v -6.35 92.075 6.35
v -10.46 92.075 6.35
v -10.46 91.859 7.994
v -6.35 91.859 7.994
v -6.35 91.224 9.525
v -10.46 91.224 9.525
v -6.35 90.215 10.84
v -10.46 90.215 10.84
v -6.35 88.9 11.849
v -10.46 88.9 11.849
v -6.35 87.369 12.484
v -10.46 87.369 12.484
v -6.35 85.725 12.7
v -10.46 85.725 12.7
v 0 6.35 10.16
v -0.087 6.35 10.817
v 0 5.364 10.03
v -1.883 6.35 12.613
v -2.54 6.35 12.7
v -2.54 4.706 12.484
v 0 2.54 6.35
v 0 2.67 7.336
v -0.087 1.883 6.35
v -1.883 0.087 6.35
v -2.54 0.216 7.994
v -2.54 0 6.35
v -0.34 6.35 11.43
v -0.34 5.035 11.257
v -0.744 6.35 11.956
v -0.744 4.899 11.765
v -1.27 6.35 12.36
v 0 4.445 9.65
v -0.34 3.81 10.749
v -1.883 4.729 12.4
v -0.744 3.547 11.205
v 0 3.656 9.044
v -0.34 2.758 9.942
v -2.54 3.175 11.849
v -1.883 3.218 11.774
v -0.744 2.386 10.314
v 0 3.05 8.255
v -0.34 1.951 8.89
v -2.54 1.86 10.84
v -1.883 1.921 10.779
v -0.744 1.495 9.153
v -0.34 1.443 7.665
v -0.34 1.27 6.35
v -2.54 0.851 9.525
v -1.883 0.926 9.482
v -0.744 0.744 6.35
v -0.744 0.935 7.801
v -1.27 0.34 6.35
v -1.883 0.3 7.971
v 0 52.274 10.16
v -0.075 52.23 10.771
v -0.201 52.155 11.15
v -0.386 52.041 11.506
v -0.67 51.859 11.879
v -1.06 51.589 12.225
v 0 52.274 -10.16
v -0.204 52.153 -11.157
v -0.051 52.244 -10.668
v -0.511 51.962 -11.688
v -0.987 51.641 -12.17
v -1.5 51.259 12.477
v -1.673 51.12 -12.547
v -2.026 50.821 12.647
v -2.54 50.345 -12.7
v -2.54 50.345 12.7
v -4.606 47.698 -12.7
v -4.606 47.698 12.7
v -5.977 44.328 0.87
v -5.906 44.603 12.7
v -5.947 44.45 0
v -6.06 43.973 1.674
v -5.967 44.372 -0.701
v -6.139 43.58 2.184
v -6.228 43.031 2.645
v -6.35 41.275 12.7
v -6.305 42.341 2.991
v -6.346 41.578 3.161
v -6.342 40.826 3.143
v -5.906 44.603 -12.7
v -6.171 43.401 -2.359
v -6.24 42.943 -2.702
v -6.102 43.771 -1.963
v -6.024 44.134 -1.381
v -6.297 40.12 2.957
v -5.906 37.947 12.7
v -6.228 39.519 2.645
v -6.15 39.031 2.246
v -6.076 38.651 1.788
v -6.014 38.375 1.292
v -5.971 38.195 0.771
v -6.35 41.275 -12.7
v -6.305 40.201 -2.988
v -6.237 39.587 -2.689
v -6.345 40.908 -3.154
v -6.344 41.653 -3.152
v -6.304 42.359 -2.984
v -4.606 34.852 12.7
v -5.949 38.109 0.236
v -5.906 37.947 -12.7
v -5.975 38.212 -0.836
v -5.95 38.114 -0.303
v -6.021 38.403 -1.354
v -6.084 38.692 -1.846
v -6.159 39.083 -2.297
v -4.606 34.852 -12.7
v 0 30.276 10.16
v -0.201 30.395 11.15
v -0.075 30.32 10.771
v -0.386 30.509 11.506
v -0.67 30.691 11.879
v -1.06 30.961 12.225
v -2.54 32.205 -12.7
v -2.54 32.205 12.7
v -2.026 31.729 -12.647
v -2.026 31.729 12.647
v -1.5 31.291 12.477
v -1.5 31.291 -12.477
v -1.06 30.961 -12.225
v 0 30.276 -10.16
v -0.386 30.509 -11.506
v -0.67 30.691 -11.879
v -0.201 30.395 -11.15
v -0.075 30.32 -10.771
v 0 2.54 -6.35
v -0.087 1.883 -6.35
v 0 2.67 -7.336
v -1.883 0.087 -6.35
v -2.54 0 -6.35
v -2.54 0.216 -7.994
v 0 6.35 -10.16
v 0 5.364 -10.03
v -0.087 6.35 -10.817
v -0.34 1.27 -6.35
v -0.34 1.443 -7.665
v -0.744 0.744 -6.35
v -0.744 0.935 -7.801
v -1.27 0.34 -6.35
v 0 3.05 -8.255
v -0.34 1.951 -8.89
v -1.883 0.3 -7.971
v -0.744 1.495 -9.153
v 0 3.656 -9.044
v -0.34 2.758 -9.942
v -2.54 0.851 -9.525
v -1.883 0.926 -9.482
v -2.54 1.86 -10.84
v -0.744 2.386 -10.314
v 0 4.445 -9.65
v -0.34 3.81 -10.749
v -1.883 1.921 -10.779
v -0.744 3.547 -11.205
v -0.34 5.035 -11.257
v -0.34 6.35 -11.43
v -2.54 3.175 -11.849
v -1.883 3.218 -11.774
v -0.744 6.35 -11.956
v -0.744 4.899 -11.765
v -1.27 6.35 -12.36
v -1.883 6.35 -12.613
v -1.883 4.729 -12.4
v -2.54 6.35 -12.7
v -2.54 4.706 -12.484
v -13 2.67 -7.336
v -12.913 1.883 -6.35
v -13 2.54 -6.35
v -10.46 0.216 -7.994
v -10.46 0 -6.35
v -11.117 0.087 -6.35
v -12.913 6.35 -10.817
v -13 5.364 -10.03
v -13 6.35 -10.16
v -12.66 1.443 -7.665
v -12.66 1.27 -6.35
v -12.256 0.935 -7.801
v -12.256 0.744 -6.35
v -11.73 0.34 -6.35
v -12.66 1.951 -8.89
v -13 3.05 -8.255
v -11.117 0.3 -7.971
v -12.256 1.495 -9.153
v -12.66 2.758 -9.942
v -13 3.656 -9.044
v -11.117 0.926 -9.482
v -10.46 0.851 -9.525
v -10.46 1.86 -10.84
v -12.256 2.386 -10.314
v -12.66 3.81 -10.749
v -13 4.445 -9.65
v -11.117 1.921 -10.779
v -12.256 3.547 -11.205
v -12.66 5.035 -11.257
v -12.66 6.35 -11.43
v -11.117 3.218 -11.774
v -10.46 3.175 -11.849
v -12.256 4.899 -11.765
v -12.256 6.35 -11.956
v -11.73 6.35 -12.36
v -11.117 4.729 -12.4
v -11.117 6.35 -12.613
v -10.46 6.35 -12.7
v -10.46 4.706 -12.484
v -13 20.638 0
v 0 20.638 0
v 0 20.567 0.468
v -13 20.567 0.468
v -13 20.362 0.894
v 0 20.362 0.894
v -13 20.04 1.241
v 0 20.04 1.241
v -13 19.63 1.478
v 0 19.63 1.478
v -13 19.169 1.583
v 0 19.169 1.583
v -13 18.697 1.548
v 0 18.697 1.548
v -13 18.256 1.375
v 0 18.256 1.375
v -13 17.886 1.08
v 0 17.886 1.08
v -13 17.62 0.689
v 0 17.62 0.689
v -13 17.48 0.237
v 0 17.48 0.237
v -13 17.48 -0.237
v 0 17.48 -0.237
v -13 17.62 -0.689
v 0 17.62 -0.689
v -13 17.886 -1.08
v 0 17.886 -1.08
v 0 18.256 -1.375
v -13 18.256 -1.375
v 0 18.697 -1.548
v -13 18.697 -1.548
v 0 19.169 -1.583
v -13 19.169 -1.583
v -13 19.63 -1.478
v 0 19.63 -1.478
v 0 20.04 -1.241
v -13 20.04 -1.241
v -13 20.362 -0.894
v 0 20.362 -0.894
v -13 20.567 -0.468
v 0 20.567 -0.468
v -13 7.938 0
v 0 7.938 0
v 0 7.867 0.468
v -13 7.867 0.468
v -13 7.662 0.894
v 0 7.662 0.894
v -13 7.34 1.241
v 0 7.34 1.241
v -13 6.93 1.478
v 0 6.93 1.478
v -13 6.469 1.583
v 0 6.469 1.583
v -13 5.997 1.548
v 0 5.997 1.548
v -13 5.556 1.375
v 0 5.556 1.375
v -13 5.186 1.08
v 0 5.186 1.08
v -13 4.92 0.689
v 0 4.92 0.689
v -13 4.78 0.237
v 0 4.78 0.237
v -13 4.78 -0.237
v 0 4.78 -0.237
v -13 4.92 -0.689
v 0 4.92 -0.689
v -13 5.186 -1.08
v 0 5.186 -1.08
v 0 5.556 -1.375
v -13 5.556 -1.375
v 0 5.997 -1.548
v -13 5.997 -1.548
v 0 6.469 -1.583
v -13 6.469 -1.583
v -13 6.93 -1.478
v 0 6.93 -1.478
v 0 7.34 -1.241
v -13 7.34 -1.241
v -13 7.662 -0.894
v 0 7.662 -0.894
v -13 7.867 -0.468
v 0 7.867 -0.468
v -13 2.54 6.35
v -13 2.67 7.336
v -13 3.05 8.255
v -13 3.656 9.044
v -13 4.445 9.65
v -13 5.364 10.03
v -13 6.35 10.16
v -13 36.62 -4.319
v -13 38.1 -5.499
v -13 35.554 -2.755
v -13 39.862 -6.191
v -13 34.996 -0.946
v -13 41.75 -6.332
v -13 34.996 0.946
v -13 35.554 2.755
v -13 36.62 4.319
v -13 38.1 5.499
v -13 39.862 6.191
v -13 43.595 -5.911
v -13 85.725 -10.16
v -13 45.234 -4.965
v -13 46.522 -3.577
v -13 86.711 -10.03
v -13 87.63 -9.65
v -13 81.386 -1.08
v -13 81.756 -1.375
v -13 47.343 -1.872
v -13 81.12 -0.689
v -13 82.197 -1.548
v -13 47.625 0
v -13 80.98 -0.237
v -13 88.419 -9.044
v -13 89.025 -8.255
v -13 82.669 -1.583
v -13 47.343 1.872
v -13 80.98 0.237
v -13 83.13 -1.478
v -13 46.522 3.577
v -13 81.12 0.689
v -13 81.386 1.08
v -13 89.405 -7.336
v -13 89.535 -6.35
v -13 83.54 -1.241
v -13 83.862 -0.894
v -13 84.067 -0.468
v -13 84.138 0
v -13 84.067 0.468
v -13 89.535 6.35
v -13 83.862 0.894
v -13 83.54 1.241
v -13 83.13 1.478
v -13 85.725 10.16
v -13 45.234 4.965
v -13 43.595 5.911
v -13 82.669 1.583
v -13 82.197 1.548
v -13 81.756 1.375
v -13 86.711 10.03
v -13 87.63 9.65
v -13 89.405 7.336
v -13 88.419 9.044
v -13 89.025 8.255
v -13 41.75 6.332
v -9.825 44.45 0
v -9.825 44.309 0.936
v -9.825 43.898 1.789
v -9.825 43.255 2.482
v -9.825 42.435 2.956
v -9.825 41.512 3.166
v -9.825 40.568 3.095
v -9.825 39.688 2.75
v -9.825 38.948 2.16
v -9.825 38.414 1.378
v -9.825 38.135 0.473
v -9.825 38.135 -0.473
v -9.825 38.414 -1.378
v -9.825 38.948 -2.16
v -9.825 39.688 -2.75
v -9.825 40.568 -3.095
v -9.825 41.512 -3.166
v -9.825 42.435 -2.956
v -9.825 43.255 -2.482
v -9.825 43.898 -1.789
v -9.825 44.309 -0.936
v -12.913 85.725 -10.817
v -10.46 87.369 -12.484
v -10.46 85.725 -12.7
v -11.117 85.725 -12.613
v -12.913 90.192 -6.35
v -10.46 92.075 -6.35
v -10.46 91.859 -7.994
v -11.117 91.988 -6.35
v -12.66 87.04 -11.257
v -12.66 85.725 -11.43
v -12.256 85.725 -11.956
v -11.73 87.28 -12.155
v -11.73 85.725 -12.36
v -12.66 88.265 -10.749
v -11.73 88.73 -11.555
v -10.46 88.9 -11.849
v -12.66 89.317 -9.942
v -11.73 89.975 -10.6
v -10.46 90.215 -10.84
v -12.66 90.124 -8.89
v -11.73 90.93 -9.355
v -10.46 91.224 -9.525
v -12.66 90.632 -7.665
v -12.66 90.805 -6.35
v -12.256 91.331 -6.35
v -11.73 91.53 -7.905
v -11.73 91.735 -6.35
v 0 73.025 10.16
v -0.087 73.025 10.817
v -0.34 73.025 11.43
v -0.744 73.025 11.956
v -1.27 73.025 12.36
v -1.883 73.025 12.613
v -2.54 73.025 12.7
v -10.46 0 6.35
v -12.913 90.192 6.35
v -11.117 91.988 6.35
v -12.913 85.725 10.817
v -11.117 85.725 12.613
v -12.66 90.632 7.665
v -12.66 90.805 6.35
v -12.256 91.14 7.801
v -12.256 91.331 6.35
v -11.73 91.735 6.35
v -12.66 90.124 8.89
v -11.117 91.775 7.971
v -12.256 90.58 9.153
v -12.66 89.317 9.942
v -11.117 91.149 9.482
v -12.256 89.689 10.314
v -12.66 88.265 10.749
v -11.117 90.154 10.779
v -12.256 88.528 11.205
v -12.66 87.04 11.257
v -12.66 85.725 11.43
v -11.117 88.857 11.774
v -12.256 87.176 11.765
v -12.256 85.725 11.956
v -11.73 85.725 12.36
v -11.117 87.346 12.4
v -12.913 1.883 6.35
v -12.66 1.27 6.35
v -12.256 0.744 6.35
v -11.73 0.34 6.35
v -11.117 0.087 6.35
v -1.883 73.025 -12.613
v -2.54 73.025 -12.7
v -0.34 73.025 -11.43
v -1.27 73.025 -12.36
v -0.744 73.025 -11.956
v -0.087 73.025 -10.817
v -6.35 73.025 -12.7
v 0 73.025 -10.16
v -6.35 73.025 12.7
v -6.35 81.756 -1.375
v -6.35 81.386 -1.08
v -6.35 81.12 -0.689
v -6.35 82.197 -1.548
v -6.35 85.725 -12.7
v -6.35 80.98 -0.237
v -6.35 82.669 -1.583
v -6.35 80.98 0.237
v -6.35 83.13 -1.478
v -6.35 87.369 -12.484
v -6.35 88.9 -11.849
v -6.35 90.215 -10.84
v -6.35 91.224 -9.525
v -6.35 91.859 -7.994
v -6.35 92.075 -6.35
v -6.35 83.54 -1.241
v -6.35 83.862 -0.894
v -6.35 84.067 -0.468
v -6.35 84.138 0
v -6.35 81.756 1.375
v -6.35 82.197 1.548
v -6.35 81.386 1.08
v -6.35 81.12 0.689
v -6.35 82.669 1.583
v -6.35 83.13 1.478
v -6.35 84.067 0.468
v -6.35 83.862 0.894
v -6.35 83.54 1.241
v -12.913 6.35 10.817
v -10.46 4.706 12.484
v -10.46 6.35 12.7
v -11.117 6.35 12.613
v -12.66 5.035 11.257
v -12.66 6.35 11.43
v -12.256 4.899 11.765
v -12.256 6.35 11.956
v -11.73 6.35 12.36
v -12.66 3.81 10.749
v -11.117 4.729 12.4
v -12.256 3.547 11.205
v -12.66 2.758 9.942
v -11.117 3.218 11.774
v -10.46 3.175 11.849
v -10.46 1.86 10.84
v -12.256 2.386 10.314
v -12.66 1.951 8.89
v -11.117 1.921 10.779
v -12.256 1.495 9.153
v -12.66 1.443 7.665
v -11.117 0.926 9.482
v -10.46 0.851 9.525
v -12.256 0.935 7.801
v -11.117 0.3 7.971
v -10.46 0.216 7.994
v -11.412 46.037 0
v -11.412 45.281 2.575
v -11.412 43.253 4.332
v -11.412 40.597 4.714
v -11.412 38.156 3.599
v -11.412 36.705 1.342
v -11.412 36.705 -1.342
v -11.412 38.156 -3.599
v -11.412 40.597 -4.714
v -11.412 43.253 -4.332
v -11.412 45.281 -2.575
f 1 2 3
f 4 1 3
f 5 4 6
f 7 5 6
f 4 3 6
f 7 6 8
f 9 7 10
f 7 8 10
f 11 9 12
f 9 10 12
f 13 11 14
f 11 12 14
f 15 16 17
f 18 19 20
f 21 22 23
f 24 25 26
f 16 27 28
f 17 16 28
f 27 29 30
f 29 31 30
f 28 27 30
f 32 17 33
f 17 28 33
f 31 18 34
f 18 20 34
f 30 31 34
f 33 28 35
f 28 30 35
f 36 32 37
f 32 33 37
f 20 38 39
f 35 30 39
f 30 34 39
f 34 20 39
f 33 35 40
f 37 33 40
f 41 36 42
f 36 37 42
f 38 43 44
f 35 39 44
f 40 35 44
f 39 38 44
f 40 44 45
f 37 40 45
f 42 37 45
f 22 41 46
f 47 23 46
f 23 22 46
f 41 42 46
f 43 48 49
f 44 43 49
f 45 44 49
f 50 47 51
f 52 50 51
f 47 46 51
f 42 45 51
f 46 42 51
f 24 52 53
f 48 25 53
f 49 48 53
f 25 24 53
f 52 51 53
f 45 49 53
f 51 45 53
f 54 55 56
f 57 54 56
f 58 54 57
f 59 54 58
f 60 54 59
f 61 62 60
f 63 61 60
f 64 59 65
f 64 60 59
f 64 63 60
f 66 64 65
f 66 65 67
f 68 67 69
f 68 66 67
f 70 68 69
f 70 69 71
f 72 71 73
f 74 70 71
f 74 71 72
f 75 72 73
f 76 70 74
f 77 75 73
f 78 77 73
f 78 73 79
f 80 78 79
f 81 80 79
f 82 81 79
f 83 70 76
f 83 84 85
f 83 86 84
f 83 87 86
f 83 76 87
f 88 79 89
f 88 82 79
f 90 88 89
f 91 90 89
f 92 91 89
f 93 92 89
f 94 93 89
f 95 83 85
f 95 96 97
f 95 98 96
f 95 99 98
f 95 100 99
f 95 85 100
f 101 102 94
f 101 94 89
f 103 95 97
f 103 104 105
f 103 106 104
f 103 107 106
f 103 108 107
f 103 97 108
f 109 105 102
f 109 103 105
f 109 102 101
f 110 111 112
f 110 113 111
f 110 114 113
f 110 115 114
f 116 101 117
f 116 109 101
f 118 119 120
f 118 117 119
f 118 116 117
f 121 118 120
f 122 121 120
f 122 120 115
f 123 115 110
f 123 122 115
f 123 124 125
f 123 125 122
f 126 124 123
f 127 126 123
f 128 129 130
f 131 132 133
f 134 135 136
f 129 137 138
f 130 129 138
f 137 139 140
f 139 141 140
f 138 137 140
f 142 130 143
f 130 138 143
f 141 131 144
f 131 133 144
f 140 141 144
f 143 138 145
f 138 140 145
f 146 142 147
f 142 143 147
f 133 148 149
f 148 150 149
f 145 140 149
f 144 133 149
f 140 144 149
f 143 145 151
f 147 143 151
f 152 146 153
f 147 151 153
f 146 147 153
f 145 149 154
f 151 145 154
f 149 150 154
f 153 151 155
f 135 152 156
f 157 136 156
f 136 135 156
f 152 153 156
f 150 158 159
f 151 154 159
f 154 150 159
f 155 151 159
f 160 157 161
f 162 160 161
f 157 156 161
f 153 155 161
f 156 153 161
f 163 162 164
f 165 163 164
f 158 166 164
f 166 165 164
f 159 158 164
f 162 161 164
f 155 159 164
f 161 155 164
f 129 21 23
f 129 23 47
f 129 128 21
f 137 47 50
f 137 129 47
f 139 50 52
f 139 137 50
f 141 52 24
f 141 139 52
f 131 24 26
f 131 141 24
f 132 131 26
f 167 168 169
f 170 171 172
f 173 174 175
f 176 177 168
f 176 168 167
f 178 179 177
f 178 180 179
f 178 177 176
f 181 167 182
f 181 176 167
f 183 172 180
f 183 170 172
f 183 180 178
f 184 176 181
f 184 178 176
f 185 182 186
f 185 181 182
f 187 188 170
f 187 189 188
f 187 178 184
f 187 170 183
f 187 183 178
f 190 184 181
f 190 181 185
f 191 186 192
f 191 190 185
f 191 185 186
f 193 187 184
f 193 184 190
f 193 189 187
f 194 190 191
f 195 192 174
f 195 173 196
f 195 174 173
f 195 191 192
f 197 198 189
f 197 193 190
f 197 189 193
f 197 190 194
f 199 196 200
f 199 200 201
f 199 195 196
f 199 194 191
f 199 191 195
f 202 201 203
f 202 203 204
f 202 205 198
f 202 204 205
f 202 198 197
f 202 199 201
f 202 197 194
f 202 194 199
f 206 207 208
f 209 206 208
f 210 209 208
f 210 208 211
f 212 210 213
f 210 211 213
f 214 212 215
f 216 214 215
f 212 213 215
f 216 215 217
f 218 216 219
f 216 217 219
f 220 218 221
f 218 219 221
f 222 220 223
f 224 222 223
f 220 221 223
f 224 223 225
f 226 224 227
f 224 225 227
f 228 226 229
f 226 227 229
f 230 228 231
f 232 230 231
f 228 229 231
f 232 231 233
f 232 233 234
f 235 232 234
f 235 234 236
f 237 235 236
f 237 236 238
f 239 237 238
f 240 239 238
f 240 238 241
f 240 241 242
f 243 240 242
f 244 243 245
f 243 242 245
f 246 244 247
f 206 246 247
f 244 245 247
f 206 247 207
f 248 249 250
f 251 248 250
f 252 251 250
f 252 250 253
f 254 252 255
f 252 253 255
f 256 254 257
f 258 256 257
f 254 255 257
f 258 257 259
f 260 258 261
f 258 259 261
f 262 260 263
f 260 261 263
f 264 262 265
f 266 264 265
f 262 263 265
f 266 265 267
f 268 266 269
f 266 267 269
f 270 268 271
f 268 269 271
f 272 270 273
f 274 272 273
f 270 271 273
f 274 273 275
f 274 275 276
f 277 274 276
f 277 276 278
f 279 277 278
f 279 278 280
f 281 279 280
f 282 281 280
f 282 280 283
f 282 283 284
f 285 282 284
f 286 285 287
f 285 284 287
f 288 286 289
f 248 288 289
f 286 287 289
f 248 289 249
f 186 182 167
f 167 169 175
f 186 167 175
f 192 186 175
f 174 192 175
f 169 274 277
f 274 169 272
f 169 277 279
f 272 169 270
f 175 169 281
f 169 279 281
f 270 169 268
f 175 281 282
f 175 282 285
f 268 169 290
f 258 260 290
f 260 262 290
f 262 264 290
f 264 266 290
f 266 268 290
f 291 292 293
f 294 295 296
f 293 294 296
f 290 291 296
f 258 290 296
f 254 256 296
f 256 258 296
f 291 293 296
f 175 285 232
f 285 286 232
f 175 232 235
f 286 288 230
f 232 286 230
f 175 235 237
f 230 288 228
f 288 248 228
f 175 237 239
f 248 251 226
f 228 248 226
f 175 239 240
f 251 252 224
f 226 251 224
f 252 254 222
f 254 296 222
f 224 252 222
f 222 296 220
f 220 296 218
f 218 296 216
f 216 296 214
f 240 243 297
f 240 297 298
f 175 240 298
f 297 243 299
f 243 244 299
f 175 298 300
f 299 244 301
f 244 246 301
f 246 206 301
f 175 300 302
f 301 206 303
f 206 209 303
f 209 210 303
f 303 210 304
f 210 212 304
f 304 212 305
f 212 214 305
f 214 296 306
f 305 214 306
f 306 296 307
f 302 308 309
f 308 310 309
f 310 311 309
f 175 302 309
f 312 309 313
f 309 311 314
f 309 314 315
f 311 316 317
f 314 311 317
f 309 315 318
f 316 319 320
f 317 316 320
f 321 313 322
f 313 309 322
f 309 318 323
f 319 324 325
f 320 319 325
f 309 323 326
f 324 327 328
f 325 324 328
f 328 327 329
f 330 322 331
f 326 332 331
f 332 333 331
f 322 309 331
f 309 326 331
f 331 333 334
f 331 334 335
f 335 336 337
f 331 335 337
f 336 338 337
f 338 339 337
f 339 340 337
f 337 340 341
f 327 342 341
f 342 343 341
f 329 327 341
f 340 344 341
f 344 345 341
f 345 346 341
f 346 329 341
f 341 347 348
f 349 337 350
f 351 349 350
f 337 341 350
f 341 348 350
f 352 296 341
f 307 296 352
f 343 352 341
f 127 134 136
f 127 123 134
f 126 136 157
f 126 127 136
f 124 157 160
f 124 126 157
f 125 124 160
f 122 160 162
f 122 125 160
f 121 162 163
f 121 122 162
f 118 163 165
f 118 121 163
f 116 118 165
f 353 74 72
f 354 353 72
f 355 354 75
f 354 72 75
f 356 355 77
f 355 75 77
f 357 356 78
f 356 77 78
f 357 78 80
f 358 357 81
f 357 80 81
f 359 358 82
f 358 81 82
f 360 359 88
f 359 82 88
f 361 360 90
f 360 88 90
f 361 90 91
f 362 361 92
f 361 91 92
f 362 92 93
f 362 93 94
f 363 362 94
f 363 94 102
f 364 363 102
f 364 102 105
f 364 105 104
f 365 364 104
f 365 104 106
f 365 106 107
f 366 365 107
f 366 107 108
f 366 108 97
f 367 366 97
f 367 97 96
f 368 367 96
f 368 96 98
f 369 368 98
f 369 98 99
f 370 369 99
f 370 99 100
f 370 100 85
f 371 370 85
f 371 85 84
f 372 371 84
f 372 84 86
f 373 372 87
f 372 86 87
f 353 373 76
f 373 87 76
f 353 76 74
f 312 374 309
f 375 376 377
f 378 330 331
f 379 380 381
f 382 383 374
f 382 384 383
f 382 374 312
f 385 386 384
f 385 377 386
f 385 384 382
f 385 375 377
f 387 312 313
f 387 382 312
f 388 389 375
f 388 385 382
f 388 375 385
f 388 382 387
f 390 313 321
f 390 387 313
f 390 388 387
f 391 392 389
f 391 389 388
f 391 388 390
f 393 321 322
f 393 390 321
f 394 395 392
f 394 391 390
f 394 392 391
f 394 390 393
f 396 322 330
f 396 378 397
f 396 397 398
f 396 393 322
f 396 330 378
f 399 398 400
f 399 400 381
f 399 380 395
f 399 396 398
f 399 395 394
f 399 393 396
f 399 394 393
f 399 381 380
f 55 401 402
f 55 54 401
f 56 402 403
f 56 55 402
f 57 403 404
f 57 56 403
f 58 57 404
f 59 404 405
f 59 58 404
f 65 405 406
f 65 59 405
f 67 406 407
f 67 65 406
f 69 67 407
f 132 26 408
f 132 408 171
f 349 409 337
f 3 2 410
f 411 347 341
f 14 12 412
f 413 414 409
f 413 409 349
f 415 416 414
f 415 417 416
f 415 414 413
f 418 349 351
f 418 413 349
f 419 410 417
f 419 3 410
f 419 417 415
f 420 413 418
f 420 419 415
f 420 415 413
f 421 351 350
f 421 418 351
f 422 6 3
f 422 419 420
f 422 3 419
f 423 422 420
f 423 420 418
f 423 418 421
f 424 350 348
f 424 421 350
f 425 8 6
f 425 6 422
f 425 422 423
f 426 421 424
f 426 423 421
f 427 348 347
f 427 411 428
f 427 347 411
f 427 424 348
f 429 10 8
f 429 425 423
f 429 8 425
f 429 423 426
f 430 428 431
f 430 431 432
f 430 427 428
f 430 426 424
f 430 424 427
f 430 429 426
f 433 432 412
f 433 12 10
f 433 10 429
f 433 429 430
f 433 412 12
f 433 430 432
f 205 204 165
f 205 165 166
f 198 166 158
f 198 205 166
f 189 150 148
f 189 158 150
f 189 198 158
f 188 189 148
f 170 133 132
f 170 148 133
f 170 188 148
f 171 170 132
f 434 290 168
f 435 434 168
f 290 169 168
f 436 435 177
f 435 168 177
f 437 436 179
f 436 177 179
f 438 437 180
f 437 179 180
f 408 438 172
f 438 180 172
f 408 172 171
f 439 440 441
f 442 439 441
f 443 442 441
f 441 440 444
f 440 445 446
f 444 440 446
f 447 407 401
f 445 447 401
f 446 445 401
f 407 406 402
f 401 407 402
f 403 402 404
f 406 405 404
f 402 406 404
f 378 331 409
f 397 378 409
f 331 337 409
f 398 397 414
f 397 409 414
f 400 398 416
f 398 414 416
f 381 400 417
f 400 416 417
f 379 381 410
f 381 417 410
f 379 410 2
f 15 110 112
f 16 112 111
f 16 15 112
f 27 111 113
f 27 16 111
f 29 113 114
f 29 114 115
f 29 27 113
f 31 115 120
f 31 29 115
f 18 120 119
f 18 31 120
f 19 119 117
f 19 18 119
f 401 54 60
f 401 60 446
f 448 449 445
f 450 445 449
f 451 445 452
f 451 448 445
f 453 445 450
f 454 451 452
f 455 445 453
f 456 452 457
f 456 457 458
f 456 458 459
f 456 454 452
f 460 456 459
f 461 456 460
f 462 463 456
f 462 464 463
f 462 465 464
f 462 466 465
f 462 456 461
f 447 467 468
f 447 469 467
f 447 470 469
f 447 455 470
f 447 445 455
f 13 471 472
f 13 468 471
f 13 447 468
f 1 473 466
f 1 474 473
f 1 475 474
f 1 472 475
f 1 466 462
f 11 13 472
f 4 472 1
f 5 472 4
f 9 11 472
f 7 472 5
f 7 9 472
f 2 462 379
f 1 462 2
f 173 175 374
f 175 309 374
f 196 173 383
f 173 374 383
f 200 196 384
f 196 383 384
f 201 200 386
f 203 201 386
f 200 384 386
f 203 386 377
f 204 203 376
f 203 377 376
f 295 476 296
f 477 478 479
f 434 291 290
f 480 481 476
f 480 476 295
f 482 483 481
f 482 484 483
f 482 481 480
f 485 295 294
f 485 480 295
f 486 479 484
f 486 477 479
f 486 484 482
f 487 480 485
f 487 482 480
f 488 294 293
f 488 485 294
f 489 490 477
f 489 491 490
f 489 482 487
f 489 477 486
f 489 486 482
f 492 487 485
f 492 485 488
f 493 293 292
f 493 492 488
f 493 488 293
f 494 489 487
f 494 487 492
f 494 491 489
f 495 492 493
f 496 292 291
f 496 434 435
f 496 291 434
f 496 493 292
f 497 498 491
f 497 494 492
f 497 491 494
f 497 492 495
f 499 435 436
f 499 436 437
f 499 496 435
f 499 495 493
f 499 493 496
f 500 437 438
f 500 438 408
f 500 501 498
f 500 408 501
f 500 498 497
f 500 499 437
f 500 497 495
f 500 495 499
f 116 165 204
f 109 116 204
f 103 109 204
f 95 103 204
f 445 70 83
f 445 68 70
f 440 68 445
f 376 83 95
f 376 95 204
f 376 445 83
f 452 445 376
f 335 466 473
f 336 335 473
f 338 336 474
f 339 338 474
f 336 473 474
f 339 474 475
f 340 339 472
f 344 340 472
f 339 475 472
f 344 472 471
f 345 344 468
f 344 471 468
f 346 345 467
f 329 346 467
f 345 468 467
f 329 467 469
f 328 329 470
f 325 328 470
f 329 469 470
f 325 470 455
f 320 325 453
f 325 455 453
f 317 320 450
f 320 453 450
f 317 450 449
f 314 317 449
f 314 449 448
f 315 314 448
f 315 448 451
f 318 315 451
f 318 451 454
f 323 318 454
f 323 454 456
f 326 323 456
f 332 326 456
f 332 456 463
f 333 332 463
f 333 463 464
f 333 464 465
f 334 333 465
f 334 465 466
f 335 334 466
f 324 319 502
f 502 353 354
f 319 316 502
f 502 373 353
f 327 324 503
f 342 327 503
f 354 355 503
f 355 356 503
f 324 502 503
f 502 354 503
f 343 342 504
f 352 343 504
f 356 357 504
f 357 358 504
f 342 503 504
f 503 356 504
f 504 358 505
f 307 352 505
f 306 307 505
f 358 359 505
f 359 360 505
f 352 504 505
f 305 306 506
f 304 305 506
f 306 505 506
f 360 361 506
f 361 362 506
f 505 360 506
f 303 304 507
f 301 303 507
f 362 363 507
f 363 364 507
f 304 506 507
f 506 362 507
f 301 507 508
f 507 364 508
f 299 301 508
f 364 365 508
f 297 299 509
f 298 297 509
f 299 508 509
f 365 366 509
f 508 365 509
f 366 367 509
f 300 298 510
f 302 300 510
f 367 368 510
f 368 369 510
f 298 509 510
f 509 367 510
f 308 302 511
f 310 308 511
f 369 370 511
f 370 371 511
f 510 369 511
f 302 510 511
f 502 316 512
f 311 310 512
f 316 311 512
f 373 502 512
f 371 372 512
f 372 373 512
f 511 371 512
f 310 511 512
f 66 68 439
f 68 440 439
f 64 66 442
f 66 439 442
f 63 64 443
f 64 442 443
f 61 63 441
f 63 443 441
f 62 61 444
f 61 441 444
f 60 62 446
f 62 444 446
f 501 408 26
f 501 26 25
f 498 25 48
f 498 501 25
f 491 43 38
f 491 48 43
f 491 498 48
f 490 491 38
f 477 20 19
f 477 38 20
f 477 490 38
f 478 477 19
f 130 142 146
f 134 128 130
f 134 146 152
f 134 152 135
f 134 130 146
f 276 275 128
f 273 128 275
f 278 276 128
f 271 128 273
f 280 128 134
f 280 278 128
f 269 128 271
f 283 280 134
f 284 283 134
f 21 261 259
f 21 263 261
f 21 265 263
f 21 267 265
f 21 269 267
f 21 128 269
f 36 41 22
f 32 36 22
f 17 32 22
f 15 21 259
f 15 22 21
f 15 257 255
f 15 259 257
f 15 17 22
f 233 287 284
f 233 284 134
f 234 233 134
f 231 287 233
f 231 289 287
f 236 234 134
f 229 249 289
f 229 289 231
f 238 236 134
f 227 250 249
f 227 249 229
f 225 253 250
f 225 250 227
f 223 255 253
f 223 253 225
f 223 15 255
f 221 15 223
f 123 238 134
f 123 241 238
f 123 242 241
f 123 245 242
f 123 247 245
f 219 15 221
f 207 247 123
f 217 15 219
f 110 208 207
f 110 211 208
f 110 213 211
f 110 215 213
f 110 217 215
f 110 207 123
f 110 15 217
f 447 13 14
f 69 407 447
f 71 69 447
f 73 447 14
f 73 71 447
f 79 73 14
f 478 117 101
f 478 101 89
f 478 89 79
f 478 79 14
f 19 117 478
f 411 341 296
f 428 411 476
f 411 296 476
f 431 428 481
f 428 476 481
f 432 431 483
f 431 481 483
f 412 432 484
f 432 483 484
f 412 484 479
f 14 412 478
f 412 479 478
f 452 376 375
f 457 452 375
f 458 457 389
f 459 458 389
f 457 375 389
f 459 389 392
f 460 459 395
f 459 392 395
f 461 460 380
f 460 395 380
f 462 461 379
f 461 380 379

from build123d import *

# Parameters (mm, degrees)
F0_R     = 1.5875
F0_R_2   = 3.175
F1_DEPTH = 13
F2_W     = 6.35
F2_H     = 19.05
F3_DEPTH = 37.5
F4_R     = 6.35
F5_R     = 2.54
F6_SIZE  = 3.175


# Not quite as in the source:
# - a feature names something its author has since deleted; it is built from what else it names


with BuildPart() as f1:
    # F0 (on Right) → F1 (new body)
    with BuildSketch(Plane.YZ):
        Polygon((0, 0), (0, -12.7), (92.075, -12.7), (92.075, 0), (92.075, 12.7), (0, 12.7), align=None)
        with Locations((6.35, 0)):
            Circle(F0_R, mode=Mode.SUBTRACT)
        with Locations((19.05, 0)):
            Circle(F0_R, mode=Mode.SUBTRACT)
        with Locations((41.275, 0)):
            Circle(F0_R_2, mode=Mode.SUBTRACT)
        with Locations((82.55, 0)):
            Circle(F0_R, mode=Mode.SUBTRACT)
    extrude(amount=-F1_DEPTH)

    # F2 (on Top) → F3 (cut, symmetric)
    with BuildSketch(Plane.XY):
        with BuildLine():
            Line((0, 30.2764773719), (0, 52.2735226281))
            ThreePointArc((0, 52.2735226281), (-6.35, 41.275), (0, 30.2764773719))
        make_face()
        with Locations((-3.175, 82.55)):
            Rectangle(F2_W, F2_H)
    extrude(amount=F3_DEPTH, both=True, mode=Mode.SUBTRACT)

    # F4
    f4_edges = [f1.edges().sort_by_distance(p)[0] for p in [
        (-6.5, 0, -12.7),
        (-6.5, 0, 12.7),
        (-9.675, 92.075, -12.7),
        (-9.675, 92.075, 12.7),
    ]]
    fillet(f4_edges, radius=F4_R)

    # F5
    f5_edges = [f1.edges().sort_by_distance(p)[0] for p in [
        (-13, 90.215128, -10.840128),
        (-13, 92.075, 0),
        (0, 0, 0),
        (0, 62.649261, 12.7),
        (0, 62.649261, -12.7),
        (-13, 0, 0),
        (0, 1.859872, -10.840128),
        (0, 1.859872, 10.840128),
        (0, 18.313239, -12.7),
        (0, 18.313239, 12.7),
        (-13, 1.859872, -10.840128),
        (-13, 1.859872, 10.840128),
        (-13, 46.0375, -12.7),
        (-13, 90.215128, 10.840128),
        (-13, 46.0375, 12.7),
    ]]
    fillet(f5_edges, radius=F5_R)

    # F6
    f6_edges = [f1.edges().sort_by_distance(p)[0] for p in [
        (-13, 38.1, 0),
    ]]
    chamfer(f6_edges, length=F6_SIZE)


solid = f1.part
